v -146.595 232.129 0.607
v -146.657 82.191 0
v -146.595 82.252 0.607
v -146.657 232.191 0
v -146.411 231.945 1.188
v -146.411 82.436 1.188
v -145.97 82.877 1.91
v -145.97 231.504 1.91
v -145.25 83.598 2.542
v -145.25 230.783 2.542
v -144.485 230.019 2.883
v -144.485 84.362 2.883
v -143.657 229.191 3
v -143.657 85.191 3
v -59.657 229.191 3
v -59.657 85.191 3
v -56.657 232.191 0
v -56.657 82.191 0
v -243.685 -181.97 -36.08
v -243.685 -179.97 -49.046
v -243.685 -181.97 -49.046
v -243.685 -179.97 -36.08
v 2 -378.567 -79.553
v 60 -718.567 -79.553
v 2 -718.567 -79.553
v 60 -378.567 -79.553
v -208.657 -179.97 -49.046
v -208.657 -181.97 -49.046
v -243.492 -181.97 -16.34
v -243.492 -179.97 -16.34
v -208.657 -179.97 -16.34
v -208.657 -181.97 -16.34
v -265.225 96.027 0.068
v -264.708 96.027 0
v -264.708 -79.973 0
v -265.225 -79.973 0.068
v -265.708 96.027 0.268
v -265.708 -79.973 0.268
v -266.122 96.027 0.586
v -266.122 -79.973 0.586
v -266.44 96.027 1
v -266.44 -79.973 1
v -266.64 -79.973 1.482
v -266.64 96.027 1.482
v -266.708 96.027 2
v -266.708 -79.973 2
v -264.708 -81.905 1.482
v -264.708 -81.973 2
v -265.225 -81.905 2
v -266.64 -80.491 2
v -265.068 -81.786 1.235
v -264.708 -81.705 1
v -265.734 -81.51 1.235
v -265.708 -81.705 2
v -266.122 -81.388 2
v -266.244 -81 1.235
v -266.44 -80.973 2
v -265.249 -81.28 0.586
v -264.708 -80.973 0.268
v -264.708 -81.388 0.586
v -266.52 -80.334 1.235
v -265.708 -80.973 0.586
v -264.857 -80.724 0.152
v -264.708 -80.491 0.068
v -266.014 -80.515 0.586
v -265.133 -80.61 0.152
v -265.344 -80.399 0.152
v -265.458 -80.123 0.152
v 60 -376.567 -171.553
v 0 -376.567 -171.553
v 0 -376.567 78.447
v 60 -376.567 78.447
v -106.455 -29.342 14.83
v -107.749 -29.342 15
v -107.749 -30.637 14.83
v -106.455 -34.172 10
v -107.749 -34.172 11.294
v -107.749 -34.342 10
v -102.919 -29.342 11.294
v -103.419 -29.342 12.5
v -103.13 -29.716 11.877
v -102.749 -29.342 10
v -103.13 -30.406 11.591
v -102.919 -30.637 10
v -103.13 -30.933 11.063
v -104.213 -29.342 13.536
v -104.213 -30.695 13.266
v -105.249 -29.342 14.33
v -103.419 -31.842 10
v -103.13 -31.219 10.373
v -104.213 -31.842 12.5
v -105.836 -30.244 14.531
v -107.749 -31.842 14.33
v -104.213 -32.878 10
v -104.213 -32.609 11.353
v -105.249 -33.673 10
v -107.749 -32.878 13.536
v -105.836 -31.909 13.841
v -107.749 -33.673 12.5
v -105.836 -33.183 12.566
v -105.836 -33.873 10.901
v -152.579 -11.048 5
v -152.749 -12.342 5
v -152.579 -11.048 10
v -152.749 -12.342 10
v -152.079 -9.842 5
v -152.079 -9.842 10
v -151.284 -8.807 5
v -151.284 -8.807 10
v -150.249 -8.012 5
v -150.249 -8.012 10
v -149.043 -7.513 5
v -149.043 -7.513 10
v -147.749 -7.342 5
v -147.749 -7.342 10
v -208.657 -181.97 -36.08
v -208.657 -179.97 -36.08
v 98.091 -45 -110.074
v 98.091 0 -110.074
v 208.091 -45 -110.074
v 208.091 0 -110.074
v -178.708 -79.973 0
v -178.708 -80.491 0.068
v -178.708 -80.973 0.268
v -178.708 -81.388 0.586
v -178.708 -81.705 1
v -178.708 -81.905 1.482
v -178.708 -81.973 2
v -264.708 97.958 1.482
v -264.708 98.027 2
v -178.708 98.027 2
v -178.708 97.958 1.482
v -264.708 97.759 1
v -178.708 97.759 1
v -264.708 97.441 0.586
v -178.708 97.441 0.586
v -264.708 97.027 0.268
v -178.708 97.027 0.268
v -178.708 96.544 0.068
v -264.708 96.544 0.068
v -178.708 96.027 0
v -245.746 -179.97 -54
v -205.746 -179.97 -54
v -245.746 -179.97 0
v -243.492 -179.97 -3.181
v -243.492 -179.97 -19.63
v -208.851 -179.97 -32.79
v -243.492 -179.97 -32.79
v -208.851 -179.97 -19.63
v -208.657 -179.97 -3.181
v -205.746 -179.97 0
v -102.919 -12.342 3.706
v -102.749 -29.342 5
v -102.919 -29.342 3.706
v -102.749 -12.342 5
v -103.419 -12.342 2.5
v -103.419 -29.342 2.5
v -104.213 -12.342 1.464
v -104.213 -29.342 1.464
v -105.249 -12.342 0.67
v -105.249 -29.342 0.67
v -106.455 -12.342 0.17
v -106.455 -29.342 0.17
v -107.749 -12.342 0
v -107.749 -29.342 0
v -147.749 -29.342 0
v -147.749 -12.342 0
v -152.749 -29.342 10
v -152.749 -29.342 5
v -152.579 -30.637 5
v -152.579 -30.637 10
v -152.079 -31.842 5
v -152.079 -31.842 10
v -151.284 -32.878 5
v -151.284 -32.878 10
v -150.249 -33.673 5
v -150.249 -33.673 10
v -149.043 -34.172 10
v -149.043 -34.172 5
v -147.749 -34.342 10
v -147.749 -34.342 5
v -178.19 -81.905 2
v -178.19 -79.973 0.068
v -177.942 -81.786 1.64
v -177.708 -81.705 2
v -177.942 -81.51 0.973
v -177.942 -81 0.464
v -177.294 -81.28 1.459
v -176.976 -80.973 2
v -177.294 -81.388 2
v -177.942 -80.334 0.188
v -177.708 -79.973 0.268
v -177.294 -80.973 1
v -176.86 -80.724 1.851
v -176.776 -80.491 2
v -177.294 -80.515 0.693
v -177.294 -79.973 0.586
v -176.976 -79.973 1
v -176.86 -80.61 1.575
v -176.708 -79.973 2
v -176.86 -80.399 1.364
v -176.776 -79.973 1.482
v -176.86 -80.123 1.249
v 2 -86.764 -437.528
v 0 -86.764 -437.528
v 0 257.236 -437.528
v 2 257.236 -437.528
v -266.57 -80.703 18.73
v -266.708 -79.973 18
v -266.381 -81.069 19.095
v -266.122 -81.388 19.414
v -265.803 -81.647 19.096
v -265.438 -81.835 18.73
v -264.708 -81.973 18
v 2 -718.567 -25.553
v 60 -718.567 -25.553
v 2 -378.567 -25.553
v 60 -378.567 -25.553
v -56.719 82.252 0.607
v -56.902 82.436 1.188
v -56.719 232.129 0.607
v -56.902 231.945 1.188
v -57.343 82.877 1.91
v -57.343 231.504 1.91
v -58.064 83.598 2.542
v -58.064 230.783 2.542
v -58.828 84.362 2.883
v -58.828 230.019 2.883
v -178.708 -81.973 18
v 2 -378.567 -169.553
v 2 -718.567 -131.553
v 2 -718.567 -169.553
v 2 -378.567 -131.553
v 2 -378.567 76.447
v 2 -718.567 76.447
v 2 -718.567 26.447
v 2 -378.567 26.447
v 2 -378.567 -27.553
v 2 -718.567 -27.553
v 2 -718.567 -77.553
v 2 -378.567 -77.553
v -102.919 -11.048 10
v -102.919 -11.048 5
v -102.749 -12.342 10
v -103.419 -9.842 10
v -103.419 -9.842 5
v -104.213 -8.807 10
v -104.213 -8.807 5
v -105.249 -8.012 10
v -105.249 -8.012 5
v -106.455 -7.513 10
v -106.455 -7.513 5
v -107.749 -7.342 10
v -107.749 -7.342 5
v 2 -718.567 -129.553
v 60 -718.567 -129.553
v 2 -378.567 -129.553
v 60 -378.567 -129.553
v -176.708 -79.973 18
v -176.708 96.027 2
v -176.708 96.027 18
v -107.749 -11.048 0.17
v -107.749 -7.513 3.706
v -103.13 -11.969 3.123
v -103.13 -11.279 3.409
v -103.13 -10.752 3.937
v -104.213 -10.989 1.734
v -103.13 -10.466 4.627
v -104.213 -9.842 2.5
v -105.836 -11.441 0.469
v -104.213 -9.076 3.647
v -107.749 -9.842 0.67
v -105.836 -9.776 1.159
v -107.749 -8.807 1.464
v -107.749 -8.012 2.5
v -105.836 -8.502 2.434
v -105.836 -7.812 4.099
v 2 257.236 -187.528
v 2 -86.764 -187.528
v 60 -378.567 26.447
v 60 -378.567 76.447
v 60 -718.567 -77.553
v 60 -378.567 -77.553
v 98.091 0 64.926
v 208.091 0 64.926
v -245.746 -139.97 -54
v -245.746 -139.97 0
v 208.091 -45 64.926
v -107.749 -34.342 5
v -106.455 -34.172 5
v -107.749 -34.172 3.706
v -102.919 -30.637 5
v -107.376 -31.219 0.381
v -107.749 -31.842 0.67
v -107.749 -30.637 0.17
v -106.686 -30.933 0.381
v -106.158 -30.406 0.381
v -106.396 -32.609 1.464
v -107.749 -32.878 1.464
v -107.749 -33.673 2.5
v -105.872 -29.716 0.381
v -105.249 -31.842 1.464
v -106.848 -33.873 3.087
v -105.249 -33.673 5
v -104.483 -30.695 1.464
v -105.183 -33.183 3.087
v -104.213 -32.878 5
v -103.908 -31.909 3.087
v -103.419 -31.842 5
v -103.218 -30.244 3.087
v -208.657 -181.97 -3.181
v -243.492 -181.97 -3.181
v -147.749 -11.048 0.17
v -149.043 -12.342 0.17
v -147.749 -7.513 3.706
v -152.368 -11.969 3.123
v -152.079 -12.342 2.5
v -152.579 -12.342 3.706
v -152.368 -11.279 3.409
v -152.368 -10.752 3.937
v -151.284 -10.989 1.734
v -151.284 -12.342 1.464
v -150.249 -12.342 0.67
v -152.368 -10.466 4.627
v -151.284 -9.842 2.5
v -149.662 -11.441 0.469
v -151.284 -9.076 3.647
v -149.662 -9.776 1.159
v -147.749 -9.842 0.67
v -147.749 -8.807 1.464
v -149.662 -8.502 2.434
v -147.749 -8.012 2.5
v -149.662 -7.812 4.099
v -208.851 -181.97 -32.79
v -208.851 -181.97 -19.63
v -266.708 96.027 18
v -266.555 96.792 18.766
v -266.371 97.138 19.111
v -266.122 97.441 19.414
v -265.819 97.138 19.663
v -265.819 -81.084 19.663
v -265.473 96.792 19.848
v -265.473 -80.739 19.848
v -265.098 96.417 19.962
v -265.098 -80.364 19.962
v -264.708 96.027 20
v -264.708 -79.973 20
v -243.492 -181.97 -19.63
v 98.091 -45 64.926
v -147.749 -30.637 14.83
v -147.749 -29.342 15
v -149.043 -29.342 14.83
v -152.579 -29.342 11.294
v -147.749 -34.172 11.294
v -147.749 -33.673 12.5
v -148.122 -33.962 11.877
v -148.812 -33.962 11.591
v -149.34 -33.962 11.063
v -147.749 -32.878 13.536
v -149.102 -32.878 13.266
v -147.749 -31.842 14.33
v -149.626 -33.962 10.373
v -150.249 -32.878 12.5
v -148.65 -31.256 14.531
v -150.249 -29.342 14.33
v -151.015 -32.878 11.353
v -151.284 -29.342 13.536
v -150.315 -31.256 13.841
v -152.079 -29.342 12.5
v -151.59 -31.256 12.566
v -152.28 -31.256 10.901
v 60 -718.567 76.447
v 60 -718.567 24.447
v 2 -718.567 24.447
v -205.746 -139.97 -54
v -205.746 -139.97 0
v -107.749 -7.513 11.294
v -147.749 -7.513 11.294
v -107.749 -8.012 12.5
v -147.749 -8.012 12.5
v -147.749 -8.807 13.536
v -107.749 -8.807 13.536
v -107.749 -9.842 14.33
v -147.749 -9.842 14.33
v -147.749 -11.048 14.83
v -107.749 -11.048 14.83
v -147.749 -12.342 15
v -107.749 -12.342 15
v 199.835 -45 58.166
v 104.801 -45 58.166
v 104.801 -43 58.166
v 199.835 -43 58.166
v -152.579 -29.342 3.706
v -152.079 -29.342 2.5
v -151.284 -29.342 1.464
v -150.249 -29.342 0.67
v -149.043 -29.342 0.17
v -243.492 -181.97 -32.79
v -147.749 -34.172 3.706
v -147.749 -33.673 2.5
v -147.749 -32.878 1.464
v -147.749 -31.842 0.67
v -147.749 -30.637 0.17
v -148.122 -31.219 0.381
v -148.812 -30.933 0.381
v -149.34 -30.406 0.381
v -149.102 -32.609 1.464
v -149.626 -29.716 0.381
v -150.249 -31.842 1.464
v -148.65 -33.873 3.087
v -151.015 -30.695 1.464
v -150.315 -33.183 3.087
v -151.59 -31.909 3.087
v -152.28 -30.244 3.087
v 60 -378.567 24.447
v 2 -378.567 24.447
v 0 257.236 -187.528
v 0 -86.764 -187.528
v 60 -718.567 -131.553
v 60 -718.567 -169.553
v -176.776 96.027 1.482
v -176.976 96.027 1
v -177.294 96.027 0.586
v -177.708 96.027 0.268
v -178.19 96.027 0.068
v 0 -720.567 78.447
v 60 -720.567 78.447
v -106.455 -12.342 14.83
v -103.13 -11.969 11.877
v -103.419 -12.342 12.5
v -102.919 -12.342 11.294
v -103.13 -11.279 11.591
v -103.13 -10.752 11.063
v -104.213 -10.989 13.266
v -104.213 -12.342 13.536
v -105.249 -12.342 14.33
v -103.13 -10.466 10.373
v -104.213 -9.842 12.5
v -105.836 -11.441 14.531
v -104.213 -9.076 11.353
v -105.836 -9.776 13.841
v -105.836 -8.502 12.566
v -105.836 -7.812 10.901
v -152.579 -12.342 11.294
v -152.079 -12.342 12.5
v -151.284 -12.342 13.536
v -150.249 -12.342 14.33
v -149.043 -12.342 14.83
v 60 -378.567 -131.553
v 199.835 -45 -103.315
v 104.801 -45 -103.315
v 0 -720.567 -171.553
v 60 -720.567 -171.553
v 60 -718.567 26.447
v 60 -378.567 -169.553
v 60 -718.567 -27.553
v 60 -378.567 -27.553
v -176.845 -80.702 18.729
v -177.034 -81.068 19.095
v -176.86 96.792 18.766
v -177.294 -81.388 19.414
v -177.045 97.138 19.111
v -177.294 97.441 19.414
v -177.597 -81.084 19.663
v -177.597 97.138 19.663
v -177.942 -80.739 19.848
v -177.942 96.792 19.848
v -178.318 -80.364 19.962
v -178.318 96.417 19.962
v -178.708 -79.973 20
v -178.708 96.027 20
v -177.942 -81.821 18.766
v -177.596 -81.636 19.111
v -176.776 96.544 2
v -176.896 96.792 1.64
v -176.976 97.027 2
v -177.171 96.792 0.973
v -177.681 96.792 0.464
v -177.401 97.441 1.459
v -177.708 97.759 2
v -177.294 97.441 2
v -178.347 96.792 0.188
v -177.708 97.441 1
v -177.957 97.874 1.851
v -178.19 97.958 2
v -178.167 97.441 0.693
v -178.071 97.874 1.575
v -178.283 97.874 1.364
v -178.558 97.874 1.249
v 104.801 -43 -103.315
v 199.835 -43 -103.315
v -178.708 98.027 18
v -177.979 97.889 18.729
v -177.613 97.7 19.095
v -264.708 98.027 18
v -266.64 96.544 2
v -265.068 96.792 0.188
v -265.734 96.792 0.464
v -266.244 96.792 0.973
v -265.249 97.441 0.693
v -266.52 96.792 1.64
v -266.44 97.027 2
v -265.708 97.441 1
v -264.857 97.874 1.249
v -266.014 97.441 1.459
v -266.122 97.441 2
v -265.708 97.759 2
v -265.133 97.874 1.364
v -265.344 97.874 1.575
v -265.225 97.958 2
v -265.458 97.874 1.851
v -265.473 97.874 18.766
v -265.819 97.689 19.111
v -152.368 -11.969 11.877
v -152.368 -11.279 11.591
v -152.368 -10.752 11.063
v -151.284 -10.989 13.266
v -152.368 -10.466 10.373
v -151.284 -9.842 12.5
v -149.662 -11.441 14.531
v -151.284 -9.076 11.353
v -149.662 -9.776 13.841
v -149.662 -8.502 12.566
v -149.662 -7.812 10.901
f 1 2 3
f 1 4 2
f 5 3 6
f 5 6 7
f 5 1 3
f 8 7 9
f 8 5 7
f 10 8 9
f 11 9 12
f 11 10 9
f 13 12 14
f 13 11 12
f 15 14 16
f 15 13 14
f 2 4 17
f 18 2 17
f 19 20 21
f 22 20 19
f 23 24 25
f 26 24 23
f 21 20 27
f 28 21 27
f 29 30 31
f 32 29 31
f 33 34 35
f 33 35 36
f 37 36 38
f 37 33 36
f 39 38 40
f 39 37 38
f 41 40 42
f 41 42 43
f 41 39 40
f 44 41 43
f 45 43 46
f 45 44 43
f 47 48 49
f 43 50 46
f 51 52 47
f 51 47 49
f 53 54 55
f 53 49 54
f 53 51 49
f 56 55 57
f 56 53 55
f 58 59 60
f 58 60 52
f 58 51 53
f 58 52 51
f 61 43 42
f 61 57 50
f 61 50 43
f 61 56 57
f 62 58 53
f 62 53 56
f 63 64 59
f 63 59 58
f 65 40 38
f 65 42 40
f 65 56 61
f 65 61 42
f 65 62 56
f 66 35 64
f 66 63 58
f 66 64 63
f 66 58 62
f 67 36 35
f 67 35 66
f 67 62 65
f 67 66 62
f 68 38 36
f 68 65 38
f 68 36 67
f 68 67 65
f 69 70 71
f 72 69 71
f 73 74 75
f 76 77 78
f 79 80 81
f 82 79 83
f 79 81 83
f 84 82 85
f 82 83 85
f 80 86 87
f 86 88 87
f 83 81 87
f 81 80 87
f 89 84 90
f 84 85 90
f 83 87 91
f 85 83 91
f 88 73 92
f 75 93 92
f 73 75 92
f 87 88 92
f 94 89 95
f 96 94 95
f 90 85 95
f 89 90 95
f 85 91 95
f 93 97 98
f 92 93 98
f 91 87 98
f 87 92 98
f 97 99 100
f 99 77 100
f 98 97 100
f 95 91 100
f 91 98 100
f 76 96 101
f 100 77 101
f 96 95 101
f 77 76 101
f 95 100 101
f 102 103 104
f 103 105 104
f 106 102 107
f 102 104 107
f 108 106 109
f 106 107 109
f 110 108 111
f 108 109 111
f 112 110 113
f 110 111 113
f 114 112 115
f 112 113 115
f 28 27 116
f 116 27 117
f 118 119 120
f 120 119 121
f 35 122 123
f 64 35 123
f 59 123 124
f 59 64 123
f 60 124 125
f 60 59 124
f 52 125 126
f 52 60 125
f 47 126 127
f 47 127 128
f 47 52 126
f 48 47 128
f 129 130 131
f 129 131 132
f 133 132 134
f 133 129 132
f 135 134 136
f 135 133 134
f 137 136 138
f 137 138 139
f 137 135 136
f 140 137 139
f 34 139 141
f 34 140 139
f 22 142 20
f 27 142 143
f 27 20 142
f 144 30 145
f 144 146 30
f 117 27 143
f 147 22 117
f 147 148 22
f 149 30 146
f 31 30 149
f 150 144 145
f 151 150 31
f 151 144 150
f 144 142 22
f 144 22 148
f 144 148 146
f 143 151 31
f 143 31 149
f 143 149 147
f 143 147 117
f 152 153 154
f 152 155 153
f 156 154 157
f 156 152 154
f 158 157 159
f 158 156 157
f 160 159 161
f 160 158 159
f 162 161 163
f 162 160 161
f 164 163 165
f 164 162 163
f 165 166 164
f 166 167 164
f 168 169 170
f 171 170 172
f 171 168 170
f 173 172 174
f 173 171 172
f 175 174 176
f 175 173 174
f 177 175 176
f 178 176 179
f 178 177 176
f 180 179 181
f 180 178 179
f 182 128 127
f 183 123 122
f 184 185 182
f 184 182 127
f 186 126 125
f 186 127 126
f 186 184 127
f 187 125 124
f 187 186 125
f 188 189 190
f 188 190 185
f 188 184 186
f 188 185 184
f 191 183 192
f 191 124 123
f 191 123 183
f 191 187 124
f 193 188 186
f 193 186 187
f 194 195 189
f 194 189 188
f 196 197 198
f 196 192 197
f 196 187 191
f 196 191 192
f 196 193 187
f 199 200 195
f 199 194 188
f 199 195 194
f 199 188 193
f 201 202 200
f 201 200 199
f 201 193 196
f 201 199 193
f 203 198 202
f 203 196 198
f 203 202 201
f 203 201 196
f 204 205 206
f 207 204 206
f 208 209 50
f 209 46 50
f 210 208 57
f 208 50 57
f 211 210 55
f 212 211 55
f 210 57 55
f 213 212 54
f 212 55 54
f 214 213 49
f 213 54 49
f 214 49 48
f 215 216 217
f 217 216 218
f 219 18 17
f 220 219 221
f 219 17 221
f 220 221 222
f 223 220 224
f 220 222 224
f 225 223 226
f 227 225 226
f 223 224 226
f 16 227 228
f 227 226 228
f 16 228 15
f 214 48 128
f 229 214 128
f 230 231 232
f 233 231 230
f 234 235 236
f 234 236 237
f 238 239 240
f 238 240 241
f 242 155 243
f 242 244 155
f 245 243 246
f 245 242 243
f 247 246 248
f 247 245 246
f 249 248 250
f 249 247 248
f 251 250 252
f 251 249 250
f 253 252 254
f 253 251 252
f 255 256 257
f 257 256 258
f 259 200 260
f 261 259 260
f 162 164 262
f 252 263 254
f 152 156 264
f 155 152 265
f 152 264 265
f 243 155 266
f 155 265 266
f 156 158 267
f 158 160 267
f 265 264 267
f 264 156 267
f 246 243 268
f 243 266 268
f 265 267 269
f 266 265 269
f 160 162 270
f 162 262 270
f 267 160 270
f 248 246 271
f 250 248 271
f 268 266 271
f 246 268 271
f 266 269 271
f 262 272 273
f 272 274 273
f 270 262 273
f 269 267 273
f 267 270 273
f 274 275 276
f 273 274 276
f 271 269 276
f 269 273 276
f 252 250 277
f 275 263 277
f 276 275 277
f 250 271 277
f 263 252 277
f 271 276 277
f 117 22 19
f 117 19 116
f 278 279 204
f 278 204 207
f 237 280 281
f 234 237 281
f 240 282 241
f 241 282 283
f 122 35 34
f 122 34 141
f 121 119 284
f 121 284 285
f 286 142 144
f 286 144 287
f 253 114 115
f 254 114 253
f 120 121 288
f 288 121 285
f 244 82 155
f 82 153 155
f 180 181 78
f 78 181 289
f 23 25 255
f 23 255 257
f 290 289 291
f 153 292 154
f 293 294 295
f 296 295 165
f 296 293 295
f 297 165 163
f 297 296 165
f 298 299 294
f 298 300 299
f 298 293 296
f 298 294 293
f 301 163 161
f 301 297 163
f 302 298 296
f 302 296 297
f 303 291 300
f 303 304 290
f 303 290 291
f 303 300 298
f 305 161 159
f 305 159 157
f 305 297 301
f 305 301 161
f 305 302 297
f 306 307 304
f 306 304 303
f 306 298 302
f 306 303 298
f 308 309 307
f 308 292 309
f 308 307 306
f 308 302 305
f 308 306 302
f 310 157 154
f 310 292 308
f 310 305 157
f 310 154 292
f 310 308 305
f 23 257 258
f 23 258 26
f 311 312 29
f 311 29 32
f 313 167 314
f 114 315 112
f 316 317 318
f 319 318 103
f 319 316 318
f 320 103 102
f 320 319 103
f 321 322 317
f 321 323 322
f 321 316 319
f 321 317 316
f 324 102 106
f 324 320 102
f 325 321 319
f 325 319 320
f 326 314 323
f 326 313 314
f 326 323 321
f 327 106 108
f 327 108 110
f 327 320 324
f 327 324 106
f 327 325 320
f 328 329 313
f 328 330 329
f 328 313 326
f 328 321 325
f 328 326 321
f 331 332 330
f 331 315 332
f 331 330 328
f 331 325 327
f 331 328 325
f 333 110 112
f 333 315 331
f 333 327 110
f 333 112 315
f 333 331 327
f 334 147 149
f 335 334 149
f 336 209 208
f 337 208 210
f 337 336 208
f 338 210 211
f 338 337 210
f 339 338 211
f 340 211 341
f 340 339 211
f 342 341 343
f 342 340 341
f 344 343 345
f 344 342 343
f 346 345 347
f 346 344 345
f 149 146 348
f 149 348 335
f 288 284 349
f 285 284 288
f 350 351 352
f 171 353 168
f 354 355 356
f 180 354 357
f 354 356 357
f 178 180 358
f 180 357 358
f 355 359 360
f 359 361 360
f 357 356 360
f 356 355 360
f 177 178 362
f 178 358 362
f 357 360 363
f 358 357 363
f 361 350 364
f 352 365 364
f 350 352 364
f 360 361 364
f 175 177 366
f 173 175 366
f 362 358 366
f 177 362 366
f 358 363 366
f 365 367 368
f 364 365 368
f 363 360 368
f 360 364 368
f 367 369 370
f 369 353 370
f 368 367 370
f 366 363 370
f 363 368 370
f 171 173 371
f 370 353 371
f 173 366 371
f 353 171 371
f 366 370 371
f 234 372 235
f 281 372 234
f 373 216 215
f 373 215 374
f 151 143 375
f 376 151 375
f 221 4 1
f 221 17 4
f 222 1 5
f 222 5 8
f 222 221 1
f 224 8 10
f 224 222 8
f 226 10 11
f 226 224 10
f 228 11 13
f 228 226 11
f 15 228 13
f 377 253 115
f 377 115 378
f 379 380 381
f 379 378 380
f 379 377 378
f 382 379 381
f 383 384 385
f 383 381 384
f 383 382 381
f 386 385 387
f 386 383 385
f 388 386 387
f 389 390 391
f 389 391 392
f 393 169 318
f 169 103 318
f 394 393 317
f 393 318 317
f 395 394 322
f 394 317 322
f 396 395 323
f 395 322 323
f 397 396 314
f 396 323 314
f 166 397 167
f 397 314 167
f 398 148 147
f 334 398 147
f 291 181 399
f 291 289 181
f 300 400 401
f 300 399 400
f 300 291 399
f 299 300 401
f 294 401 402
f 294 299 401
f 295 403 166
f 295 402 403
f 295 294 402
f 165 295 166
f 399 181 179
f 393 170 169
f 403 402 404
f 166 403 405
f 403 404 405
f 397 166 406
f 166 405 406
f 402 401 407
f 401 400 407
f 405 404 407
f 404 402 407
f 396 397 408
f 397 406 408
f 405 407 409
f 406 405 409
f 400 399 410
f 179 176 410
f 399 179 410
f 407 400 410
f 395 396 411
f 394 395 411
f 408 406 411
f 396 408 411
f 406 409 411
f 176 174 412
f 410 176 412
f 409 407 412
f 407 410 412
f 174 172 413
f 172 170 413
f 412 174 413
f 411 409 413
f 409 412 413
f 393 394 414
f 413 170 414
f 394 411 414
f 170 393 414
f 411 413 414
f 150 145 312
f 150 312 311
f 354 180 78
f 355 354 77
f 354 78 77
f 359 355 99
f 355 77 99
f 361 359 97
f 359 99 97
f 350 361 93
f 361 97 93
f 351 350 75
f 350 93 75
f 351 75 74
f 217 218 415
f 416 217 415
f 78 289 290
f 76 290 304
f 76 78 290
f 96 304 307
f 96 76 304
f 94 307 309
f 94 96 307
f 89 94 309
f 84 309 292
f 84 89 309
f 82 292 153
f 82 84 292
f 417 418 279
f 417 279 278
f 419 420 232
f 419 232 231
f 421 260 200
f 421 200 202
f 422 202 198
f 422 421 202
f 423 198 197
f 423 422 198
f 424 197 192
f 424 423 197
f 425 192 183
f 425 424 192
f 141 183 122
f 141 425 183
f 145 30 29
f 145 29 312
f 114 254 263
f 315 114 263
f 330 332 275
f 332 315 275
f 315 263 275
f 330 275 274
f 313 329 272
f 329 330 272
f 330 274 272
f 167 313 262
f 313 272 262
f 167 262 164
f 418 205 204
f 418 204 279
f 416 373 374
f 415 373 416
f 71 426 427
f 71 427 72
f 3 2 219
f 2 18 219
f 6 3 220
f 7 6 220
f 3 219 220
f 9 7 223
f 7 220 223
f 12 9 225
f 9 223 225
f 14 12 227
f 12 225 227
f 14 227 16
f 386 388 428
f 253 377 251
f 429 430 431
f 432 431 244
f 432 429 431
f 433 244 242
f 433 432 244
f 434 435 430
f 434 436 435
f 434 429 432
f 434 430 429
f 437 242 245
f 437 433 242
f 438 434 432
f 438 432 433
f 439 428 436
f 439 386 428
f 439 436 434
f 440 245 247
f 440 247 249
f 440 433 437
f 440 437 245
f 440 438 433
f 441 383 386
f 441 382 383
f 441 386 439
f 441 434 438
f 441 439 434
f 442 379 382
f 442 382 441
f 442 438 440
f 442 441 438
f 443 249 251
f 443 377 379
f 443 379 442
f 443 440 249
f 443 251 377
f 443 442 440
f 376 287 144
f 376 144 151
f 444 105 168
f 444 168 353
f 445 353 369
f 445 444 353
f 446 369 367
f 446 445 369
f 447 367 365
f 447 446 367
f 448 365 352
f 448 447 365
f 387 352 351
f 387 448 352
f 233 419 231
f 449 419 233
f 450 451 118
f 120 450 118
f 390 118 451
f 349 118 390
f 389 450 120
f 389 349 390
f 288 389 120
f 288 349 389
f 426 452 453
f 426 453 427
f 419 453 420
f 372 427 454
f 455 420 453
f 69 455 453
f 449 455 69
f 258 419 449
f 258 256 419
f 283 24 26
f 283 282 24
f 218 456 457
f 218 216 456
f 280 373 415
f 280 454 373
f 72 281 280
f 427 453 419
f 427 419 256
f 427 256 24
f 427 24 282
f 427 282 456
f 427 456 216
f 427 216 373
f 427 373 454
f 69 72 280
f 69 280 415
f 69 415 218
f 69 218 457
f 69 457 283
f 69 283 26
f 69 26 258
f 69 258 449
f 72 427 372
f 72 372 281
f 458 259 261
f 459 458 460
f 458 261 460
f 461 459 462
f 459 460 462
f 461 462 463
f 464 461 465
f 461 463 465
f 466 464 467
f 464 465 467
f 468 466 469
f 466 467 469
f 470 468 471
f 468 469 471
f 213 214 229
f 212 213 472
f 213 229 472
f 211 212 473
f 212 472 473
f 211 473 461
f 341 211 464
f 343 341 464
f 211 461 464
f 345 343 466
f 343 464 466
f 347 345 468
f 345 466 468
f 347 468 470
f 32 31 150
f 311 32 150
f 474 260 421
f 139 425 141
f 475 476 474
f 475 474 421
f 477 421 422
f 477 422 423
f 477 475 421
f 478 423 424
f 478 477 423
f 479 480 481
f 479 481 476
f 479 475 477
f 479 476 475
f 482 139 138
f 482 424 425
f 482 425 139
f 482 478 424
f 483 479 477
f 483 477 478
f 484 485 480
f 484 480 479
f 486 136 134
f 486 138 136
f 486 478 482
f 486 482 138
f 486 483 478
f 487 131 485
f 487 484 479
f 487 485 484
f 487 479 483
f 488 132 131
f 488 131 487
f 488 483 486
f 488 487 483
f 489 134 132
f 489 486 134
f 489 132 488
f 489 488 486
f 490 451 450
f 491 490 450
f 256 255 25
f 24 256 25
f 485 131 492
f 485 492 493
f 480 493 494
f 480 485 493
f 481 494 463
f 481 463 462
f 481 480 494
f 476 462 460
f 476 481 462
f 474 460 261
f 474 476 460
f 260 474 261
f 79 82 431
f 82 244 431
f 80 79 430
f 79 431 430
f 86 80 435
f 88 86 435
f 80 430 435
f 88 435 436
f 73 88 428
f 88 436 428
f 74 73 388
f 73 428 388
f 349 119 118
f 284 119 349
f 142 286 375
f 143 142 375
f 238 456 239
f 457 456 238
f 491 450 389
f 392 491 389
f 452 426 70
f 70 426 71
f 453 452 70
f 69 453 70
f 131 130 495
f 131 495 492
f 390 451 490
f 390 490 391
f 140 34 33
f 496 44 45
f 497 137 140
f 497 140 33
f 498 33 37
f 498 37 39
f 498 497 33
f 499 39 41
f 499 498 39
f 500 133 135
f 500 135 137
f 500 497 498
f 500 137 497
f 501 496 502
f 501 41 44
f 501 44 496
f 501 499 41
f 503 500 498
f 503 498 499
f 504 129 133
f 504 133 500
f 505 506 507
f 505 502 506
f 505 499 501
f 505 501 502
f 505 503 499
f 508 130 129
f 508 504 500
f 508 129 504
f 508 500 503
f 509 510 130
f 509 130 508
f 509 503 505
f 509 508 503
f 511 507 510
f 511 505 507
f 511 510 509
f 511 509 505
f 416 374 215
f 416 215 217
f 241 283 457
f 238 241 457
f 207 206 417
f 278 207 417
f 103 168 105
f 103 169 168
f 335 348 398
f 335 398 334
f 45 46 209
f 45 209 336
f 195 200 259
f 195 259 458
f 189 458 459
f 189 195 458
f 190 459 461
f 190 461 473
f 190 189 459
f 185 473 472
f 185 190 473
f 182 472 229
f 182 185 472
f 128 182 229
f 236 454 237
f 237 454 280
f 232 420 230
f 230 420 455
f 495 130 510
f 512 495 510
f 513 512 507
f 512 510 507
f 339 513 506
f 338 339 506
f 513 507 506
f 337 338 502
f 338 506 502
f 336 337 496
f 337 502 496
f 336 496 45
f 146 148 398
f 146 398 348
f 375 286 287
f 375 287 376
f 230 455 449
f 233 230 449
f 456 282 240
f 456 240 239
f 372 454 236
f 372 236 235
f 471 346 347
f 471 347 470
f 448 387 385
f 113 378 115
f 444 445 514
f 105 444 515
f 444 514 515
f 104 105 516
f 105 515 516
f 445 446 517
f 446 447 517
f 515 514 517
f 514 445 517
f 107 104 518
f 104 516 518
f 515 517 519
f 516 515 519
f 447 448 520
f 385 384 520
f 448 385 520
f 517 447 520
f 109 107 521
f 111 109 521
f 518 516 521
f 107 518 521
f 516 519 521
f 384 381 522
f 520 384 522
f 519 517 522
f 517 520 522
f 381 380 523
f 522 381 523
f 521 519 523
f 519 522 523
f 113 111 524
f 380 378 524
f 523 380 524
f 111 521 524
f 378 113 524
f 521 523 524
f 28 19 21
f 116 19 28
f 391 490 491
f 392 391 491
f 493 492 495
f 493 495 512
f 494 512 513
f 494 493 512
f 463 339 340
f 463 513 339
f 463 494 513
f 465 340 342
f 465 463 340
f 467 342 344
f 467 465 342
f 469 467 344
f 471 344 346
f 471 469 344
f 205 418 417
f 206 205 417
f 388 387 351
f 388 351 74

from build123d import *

# Parameters (mm, degrees)
F0_W         = 90
F0_H         = 180
F1_DEPTH     = 20
F2_R         = 2
F3_T1_DEPTH  = 21
F3_T3_DEPTH  = 86
F3_T5_DEPTH  = 176
F3_S9_W      = 2.04
F3_S9_H      = 2.04
F3_T10_DEPTH = 2.04
F3_S15_W     = 2.04
F3_S15_H     = 2.04
F3_T16_DEPTH = 2.04
F3_S21_W     = 2.04
F3_S21_H     = 2.04
F3_T22_DEPTH = 2.04
F3_S27_W     = 2.04
F3_S27_H     = 2.04
F3_T28_DEPTH = 2.04
F4_W         = 90
F4_H         = 150
F5_DEPTH     = 3
F6_R         = 2.99999
F7_W         = 50
F7_H         = 27
F8_DEPTH     = 15
F9_R         = 5
F10_W        = 110
F10_H        = 175
F11_DEPTH    = 45
F12_W        = 95.0341746211
F12_H        = 161.4808551967
F13_DEPTH    = 2
F14_W        = 344
F14_H        = 250
F15_DEPTH    = 60
F16_W        = 340
F16_H        = 50
F16_H_2      = 38
F17_DEPTH    = 58
F18_W        = 344
F18_H        = 250
F19_DEPTH    = 2
F20_W        = 40
F20_H        = 40
F21_DEPTH    = 54
F22_W        = 34.8343998194
F22_H        = 13.1596634164
F22_W_2      = 34.6408784389
F22_H_2      = 13.1596643478
F22_W_3      = 35.0279211998
F22_H_3      = 12.9661373794
F23_DEPTH    = 2


# Not quite as in the source:
# - a fillet or chamfer that OpenCascade refuses, or shapes differently, is made with other operations: its cross-section is extruded or revolved along the edge and cut away or added
# - a fillet or chamfer is up to 0.001 mm smaller than in the source, because OpenCascade refuses the exact size


with BuildPart() as f1:
    # F0 (on Top) → F1 (new body)
    with BuildSketch(Plane.XY):
        with Locations((-221.7077744007, 8.0266410112)):
            Rectangle(F0_W, F0_H)
    extrude(amount=F1_DEPTH)

    # F2
    f2_edges = [f1.edges().sort_by_distance(p)[0] for p in [
        (-221.707774, 98.026641, 20),
        (-266.707774, 8.026641, 20),
        (-221.707774, -81.973359, 20),
        (-176.707774, 8.026641, 20),
    ]]
    fillet(f2_edges, radius=F2_R)

    # F3: fillet of radius 2 on 16 edges, made by hand

    # F3_s2 → F3_t1 (cut)
    with BuildSketch(Plane.XY.offset(2)):
        with BuildLine():
            ThreePointArc((-266.7077744007, -79.9733589888), (-266.1219879631, -81.3875725511), (-264.7077744007, -81.9733589888))
            Line((-264.7077744007, -81.9733589888), (-266.7077744007, -81.9733589888))
            Line((-266.7077744007, -81.9733589888), (-266.7077744007, -79.9733589888))
        make_face()
        with BuildLine():
            ThreePointArc((-176.7077744007, -79.9733589888), (-177.2935608383, -81.3875725511), (-178.7077744007, -81.9733589888))
            Line((-178.7077744007, -81.9733589888), (-176.7077744007, -81.9733589888))
            Line((-176.7077744007, -81.9733589888), (-176.7077744007, -79.9733589888))
        make_face()
        with BuildLine():
            ThreePointArc((-178.7077744007, 98.0266410112), (-177.2935608383, 97.4408545736), (-176.7077744007, 96.0266410112))
            Line((-176.7077744007, 96.0266410112), (-176.7077744007, 98.0266410112))
            Line((-176.7077744007, 98.0266410112), (-178.7077744007, 98.0266410112))
        make_face()
        with BuildLine():
            ThreePointArc((-264.7077744007, 98.0266410112), (-266.1219879631, 97.4408545736), (-266.7077744007, 96.0266410112))
            Line((-266.7077744007, 96.0266410112), (-266.7077744007, 98.0266410112))
            Line((-266.7077744007, 98.0266410112), (-264.7077744007, 98.0266410112))
        make_face()
    extrude(amount=F3_T1_DEPTH, mode=Mode.SUBTRACT)

    # F3_s4 → F3_t3 (cut)
    with BuildSketch(Plane.YZ.offset(-264.7077744007)):
        with BuildLine():
            ThreePointArc((-79.9733589888, 0), (-81.3875725511, 0.5857864376), (-81.9733589888, 2))
            Line((-81.9733589888, 2), (-81.9733589888, 0))
            Line((-81.9733589888, 0), (-79.9733589888, 0))
        make_face()
        with BuildLine():
            ThreePointArc((98.0266410112, 2), (97.4408545736, 0.5857864376), (96.0266410112, 0))
            Line((96.0266410112, 0), (98.0266410112, 0))
            Line((98.0266410112, 0), (98.0266410112, 2))
        make_face()
    extrude(amount=F3_T3_DEPTH, mode=Mode.SUBTRACT)

    # F3_s6 → F3_t5 (cut)
    with BuildSketch(Plane.XZ.offset(-96.0266410112)):
        with BuildLine():
            ThreePointArc((-176.7077744007, 2), (-177.2935608383, 0.5857864376), (-178.7077744007, 0))
            Line((-178.7077744007, 0), (-176.7077744007, 0))
            Line((-176.7077744007, 0), (-176.7077744007, 2))
        make_face()
        with BuildLine():
            ThreePointArc((-264.7077744007, 0), (-266.1219879631, 0.5857864376), (-266.7077744007, 2))
            Line((-266.7077744007, 2), (-266.7077744007, 0))
            Line((-266.7077744007, 0), (-264.7077744007, 0))
        make_face()
    extrude(amount=F3_T5_DEPTH, mode=Mode.SUBTRACT)


with BuildPart() as f3_tool8:
    # F3_s9 → F3_t10 (new body)
    with BuildSketch(Plane.XY.offset(2)):
        with Locations((-265.7277744007, -80.9933589888)):
            Rectangle(F3_S9_W, F3_S9_H)
    extrude(amount=-F3_T10_DEPTH)

    # F3_s11 → F3_t12 (revolve, cut)
    with BuildSketch(Plane(origin=(-264.7077744007, -79.9733589888, 2), x_dir=(0.7071067812, 0.7071067812, 0), z_dir=(-0.7071067812, 0.7071067812, 0))):
        with BuildLine():
            ThreePointArc((0, -2), (2, 0), (0, 2))
            Line((0, 2), (0, -2))
        make_face()
    revolve(axis=Axis((-264.7077744007, -79.9733589888, 2), (0, 0, -1)), mode=Mode.SUBTRACT)


with BuildPart() as f1_1:
    add(f1.part)

    # F3_t7: cut F3_tool8
    add(f3_tool8.part, mode=Mode.SUBTRACT)


with BuildPart() as f3_tool14:
    # F3_s15 → F3_t16 (new body)
    with BuildSketch(Plane.YZ.offset(-178.7077744007)):
        with Locations((-80.9933589888, 0.98)):
            Rectangle(F3_S15_W, F3_S15_H)
    extrude(amount=F3_T16_DEPTH)

    # F3_s17 → F3_t18 (revolve, cut)
    with BuildSketch(Plane(origin=(-178.7077744007, -79.9733589888, 2), x_dir=(0, 0.7071067812, 0.7071067812), z_dir=(0, 0.7071067812, -0.7071067812))):
        with BuildLine():
            ThreePointArc((0, -2), (2, 0), (0, 2))
            Line((0, 2), (0, -2))
        make_face()
    revolve(axis=Axis((-178.7077744007, -79.9733589888, 2), (1, 0, 0)), mode=Mode.SUBTRACT)


with BuildPart() as f1_2:
    add(f1_1.part)

    # F3_t13: cut F3_tool14
    add(f3_tool14.part, mode=Mode.SUBTRACT)


with BuildPart() as f3_tool20:
    # F3_s21 → F3_t22 (new body)
    with BuildSketch(Plane.XZ.offset(-96.0266410112)):
        with Locations((-177.6877744007, 0.98)):
            Rectangle(F3_S21_W, F3_S21_H)
    extrude(amount=-F3_T22_DEPTH)

    # F3_s23 → F3_t24 (revolve, cut)
    with BuildSketch(Plane(origin=(-178.7077744007, 96.0266410112, 2), x_dir=(-0.7071067812, 0, 0.7071067812), z_dir=(-0.7071067812, 0, -0.7071067812))):
        with BuildLine():
            ThreePointArc((0, -2), (2, 0), (0, 2))
            Line((0, 2), (0, -2))
        make_face()
    revolve(axis=Axis((-178.7077744007, 96.0266410112, 2), (0, 1, 0)), mode=Mode.SUBTRACT)


with BuildPart() as f1_3:
    add(f1_2.part)

    # F3_t19: cut F3_tool20
    add(f3_tool20.part, mode=Mode.SUBTRACT)


with BuildPart() as f3_tool26:
    # F3_s27 → F3_t28 (new body)
    with BuildSketch(Plane.XZ.offset(-96.0266410112)):
        with Locations((-265.7277744007, 0.98)):
            Rectangle(F3_S27_W, F3_S27_H)
    extrude(amount=-F3_T28_DEPTH)

    # F3_s29 → F3_t30 (revolve, cut)
    with BuildSketch(Plane(origin=(-264.7077744007, 96.0266410112, 2), x_dir=(0.7071067812, 0, 0.7071067812), z_dir=(-0.7071067812, 0, 0.7071067812))):
        with BuildLine():
            ThreePointArc((0, -2), (2, 0), (0, 2))
            Line((0, 2), (0, -2))
        make_face()
    revolve(axis=Axis((-264.7077744007, 96.0266410112, 2), (0, 1, 0)), mode=Mode.SUBTRACT)


with BuildPart() as f1_4:
    add(f1_3.part)

    # F3_t25: cut F3_tool26
    add(f3_tool26.part, mode=Mode.SUBTRACT)


with BuildPart() as f5:
    # F4 (on Top) → F5 (new body)
    with BuildSketch(Plane.XY):
        with Locations((-101.6566661, 157.1905210614)):
            Rectangle(F4_W, F4_H)
    extrude(amount=F5_DEPTH)

    # F6 (radius 3 in the source; OpenCascade refuses exactly that, so slightly less here)
    f6_edges = [f5.edges().sort_by_distance(p)[0] for p in [
        (-101.656666, 82.190521, 3),
        (-56.656666, 157.190521, 3),
        (-101.656666, 232.190521, 3),
        (-146.656666, 157.190521, 3),
    ]]
    fillet(f6_edges, radius=F6_R)


with BuildPart() as f8:
    # F7 (on Top) → F8 (new body)
    with BuildSketch(Plane.XY):
        with Locations((-127.7489569783, -20.8424640596)):
            Rectangle(F7_W, F7_H)
    extrude(amount=F8_DEPTH)

    # F9
    f9_edges = [f8.edges().sort_by_distance(p)[0] for p in [
        (-127.748957, -7.342464, 15),
        (-152.748957, -20.842464, 15),
        (-127.748957, -34.342464, 15),
        (-102.748957, -20.842464, 15),
        (-152.748957, -34.342464, 7.5),
        (-102.748957, -34.342464, 7.5),
        (-127.748957, -34.342464, 0),
        (-127.748957, -7.342464, 0),
        (-152.748957, -20.842464, 0),
        (-102.748957, -20.842464, 0),
        (-152.748957, -7.342464, 7.5),
        (-102.748957, -7.342464, 7.5),
    ]]
    fillet(f9_edges, radius=F9_R)


with BuildPart() as f11:
    # F10 (on Front) → F11 (new body)
    with BuildSketch(Plane.XZ):
        with Locations((153.0910205841, -22.574326396)):
            Rectangle(F10_W, F10_H)
    extrude(amount=F11_DEPTH)

    # F12 (on face) → F13 (cut)
    with BuildSketch(Plane.XZ.offset(45)):
        with Locations((152.3183919489, -22.5743371993)):
            Rectangle(F12_W, F12_H)
    extrude(amount=-F13_DEPTH, mode=Mode.SUBTRACT)


with BuildPart() as f15:
    # F14 (on Right) → F15 (new body)
    with BuildSketch(Plane.YZ):
        with Locations((-548.5665888786, -46.5534925461)):
            Rectangle(F14_W, F14_H)
    extrude(amount=F15_DEPTH)

    # F16 (on face) → F17 (cut)
    with BuildSketch(Plane.YZ.offset(60)):
        with Locations((-548.5665888786, 51.4465074539)):
            Rectangle(F16_W, F16_H)
        with Locations((-548.5665888786, -0.5534925461)):
            Rectangle(F16_W, F16_H)
        with Locations((-548.5665888786, -52.5534925461)):
            Rectangle(F16_W, F16_H)
        with Locations((-548.5665888786, -104.5534925461)):
            Rectangle(F16_W, F16_H)
        with Locations((-548.5665888786, -150.5534925461)):
            Rectangle(F16_W, F16_H_2)
    extrude(amount=-F17_DEPTH, mode=Mode.SUBTRACT)


with BuildPart() as f19:
    # F18 (on Right) → F19 (new body)
    with BuildSketch(Plane.YZ):
        with Locations((85.2359144688, -312.5276565552)):
            Rectangle(F18_W, F18_H)
    extrude(amount=F19_DEPTH)


with BuildPart() as f21:
    # F20 (on Top) → F21 (new body)
    with BuildSketch(Plane.XY):
        with Locations((-225.745741725, -159.9699962139)):
            Rectangle(F20_W, F20_H)
    extrude(amount=-F21_DEPTH)

    # F22 (on face) → F23 (join)
    with BuildSketch(Plane.XZ.offset(179.9699962139)):
        with Locations((-226.0745540261, -9.7604426555)):
            Rectangle(F22_W, F22_H)
        with Locations((-226.1713147163, -26.2100240216)):
            Rectangle(F22_W_2, F22_H_2)
        with Locations((-226.1713147163, -42.5628405064)):
            Rectangle(F22_W_3, F22_H_3)
    extrude(amount=F23_DEPTH)


solid = Compound([f1_4.part, f5.part, f8.part, f11.part, f15.part, f19.part, f21.part])
